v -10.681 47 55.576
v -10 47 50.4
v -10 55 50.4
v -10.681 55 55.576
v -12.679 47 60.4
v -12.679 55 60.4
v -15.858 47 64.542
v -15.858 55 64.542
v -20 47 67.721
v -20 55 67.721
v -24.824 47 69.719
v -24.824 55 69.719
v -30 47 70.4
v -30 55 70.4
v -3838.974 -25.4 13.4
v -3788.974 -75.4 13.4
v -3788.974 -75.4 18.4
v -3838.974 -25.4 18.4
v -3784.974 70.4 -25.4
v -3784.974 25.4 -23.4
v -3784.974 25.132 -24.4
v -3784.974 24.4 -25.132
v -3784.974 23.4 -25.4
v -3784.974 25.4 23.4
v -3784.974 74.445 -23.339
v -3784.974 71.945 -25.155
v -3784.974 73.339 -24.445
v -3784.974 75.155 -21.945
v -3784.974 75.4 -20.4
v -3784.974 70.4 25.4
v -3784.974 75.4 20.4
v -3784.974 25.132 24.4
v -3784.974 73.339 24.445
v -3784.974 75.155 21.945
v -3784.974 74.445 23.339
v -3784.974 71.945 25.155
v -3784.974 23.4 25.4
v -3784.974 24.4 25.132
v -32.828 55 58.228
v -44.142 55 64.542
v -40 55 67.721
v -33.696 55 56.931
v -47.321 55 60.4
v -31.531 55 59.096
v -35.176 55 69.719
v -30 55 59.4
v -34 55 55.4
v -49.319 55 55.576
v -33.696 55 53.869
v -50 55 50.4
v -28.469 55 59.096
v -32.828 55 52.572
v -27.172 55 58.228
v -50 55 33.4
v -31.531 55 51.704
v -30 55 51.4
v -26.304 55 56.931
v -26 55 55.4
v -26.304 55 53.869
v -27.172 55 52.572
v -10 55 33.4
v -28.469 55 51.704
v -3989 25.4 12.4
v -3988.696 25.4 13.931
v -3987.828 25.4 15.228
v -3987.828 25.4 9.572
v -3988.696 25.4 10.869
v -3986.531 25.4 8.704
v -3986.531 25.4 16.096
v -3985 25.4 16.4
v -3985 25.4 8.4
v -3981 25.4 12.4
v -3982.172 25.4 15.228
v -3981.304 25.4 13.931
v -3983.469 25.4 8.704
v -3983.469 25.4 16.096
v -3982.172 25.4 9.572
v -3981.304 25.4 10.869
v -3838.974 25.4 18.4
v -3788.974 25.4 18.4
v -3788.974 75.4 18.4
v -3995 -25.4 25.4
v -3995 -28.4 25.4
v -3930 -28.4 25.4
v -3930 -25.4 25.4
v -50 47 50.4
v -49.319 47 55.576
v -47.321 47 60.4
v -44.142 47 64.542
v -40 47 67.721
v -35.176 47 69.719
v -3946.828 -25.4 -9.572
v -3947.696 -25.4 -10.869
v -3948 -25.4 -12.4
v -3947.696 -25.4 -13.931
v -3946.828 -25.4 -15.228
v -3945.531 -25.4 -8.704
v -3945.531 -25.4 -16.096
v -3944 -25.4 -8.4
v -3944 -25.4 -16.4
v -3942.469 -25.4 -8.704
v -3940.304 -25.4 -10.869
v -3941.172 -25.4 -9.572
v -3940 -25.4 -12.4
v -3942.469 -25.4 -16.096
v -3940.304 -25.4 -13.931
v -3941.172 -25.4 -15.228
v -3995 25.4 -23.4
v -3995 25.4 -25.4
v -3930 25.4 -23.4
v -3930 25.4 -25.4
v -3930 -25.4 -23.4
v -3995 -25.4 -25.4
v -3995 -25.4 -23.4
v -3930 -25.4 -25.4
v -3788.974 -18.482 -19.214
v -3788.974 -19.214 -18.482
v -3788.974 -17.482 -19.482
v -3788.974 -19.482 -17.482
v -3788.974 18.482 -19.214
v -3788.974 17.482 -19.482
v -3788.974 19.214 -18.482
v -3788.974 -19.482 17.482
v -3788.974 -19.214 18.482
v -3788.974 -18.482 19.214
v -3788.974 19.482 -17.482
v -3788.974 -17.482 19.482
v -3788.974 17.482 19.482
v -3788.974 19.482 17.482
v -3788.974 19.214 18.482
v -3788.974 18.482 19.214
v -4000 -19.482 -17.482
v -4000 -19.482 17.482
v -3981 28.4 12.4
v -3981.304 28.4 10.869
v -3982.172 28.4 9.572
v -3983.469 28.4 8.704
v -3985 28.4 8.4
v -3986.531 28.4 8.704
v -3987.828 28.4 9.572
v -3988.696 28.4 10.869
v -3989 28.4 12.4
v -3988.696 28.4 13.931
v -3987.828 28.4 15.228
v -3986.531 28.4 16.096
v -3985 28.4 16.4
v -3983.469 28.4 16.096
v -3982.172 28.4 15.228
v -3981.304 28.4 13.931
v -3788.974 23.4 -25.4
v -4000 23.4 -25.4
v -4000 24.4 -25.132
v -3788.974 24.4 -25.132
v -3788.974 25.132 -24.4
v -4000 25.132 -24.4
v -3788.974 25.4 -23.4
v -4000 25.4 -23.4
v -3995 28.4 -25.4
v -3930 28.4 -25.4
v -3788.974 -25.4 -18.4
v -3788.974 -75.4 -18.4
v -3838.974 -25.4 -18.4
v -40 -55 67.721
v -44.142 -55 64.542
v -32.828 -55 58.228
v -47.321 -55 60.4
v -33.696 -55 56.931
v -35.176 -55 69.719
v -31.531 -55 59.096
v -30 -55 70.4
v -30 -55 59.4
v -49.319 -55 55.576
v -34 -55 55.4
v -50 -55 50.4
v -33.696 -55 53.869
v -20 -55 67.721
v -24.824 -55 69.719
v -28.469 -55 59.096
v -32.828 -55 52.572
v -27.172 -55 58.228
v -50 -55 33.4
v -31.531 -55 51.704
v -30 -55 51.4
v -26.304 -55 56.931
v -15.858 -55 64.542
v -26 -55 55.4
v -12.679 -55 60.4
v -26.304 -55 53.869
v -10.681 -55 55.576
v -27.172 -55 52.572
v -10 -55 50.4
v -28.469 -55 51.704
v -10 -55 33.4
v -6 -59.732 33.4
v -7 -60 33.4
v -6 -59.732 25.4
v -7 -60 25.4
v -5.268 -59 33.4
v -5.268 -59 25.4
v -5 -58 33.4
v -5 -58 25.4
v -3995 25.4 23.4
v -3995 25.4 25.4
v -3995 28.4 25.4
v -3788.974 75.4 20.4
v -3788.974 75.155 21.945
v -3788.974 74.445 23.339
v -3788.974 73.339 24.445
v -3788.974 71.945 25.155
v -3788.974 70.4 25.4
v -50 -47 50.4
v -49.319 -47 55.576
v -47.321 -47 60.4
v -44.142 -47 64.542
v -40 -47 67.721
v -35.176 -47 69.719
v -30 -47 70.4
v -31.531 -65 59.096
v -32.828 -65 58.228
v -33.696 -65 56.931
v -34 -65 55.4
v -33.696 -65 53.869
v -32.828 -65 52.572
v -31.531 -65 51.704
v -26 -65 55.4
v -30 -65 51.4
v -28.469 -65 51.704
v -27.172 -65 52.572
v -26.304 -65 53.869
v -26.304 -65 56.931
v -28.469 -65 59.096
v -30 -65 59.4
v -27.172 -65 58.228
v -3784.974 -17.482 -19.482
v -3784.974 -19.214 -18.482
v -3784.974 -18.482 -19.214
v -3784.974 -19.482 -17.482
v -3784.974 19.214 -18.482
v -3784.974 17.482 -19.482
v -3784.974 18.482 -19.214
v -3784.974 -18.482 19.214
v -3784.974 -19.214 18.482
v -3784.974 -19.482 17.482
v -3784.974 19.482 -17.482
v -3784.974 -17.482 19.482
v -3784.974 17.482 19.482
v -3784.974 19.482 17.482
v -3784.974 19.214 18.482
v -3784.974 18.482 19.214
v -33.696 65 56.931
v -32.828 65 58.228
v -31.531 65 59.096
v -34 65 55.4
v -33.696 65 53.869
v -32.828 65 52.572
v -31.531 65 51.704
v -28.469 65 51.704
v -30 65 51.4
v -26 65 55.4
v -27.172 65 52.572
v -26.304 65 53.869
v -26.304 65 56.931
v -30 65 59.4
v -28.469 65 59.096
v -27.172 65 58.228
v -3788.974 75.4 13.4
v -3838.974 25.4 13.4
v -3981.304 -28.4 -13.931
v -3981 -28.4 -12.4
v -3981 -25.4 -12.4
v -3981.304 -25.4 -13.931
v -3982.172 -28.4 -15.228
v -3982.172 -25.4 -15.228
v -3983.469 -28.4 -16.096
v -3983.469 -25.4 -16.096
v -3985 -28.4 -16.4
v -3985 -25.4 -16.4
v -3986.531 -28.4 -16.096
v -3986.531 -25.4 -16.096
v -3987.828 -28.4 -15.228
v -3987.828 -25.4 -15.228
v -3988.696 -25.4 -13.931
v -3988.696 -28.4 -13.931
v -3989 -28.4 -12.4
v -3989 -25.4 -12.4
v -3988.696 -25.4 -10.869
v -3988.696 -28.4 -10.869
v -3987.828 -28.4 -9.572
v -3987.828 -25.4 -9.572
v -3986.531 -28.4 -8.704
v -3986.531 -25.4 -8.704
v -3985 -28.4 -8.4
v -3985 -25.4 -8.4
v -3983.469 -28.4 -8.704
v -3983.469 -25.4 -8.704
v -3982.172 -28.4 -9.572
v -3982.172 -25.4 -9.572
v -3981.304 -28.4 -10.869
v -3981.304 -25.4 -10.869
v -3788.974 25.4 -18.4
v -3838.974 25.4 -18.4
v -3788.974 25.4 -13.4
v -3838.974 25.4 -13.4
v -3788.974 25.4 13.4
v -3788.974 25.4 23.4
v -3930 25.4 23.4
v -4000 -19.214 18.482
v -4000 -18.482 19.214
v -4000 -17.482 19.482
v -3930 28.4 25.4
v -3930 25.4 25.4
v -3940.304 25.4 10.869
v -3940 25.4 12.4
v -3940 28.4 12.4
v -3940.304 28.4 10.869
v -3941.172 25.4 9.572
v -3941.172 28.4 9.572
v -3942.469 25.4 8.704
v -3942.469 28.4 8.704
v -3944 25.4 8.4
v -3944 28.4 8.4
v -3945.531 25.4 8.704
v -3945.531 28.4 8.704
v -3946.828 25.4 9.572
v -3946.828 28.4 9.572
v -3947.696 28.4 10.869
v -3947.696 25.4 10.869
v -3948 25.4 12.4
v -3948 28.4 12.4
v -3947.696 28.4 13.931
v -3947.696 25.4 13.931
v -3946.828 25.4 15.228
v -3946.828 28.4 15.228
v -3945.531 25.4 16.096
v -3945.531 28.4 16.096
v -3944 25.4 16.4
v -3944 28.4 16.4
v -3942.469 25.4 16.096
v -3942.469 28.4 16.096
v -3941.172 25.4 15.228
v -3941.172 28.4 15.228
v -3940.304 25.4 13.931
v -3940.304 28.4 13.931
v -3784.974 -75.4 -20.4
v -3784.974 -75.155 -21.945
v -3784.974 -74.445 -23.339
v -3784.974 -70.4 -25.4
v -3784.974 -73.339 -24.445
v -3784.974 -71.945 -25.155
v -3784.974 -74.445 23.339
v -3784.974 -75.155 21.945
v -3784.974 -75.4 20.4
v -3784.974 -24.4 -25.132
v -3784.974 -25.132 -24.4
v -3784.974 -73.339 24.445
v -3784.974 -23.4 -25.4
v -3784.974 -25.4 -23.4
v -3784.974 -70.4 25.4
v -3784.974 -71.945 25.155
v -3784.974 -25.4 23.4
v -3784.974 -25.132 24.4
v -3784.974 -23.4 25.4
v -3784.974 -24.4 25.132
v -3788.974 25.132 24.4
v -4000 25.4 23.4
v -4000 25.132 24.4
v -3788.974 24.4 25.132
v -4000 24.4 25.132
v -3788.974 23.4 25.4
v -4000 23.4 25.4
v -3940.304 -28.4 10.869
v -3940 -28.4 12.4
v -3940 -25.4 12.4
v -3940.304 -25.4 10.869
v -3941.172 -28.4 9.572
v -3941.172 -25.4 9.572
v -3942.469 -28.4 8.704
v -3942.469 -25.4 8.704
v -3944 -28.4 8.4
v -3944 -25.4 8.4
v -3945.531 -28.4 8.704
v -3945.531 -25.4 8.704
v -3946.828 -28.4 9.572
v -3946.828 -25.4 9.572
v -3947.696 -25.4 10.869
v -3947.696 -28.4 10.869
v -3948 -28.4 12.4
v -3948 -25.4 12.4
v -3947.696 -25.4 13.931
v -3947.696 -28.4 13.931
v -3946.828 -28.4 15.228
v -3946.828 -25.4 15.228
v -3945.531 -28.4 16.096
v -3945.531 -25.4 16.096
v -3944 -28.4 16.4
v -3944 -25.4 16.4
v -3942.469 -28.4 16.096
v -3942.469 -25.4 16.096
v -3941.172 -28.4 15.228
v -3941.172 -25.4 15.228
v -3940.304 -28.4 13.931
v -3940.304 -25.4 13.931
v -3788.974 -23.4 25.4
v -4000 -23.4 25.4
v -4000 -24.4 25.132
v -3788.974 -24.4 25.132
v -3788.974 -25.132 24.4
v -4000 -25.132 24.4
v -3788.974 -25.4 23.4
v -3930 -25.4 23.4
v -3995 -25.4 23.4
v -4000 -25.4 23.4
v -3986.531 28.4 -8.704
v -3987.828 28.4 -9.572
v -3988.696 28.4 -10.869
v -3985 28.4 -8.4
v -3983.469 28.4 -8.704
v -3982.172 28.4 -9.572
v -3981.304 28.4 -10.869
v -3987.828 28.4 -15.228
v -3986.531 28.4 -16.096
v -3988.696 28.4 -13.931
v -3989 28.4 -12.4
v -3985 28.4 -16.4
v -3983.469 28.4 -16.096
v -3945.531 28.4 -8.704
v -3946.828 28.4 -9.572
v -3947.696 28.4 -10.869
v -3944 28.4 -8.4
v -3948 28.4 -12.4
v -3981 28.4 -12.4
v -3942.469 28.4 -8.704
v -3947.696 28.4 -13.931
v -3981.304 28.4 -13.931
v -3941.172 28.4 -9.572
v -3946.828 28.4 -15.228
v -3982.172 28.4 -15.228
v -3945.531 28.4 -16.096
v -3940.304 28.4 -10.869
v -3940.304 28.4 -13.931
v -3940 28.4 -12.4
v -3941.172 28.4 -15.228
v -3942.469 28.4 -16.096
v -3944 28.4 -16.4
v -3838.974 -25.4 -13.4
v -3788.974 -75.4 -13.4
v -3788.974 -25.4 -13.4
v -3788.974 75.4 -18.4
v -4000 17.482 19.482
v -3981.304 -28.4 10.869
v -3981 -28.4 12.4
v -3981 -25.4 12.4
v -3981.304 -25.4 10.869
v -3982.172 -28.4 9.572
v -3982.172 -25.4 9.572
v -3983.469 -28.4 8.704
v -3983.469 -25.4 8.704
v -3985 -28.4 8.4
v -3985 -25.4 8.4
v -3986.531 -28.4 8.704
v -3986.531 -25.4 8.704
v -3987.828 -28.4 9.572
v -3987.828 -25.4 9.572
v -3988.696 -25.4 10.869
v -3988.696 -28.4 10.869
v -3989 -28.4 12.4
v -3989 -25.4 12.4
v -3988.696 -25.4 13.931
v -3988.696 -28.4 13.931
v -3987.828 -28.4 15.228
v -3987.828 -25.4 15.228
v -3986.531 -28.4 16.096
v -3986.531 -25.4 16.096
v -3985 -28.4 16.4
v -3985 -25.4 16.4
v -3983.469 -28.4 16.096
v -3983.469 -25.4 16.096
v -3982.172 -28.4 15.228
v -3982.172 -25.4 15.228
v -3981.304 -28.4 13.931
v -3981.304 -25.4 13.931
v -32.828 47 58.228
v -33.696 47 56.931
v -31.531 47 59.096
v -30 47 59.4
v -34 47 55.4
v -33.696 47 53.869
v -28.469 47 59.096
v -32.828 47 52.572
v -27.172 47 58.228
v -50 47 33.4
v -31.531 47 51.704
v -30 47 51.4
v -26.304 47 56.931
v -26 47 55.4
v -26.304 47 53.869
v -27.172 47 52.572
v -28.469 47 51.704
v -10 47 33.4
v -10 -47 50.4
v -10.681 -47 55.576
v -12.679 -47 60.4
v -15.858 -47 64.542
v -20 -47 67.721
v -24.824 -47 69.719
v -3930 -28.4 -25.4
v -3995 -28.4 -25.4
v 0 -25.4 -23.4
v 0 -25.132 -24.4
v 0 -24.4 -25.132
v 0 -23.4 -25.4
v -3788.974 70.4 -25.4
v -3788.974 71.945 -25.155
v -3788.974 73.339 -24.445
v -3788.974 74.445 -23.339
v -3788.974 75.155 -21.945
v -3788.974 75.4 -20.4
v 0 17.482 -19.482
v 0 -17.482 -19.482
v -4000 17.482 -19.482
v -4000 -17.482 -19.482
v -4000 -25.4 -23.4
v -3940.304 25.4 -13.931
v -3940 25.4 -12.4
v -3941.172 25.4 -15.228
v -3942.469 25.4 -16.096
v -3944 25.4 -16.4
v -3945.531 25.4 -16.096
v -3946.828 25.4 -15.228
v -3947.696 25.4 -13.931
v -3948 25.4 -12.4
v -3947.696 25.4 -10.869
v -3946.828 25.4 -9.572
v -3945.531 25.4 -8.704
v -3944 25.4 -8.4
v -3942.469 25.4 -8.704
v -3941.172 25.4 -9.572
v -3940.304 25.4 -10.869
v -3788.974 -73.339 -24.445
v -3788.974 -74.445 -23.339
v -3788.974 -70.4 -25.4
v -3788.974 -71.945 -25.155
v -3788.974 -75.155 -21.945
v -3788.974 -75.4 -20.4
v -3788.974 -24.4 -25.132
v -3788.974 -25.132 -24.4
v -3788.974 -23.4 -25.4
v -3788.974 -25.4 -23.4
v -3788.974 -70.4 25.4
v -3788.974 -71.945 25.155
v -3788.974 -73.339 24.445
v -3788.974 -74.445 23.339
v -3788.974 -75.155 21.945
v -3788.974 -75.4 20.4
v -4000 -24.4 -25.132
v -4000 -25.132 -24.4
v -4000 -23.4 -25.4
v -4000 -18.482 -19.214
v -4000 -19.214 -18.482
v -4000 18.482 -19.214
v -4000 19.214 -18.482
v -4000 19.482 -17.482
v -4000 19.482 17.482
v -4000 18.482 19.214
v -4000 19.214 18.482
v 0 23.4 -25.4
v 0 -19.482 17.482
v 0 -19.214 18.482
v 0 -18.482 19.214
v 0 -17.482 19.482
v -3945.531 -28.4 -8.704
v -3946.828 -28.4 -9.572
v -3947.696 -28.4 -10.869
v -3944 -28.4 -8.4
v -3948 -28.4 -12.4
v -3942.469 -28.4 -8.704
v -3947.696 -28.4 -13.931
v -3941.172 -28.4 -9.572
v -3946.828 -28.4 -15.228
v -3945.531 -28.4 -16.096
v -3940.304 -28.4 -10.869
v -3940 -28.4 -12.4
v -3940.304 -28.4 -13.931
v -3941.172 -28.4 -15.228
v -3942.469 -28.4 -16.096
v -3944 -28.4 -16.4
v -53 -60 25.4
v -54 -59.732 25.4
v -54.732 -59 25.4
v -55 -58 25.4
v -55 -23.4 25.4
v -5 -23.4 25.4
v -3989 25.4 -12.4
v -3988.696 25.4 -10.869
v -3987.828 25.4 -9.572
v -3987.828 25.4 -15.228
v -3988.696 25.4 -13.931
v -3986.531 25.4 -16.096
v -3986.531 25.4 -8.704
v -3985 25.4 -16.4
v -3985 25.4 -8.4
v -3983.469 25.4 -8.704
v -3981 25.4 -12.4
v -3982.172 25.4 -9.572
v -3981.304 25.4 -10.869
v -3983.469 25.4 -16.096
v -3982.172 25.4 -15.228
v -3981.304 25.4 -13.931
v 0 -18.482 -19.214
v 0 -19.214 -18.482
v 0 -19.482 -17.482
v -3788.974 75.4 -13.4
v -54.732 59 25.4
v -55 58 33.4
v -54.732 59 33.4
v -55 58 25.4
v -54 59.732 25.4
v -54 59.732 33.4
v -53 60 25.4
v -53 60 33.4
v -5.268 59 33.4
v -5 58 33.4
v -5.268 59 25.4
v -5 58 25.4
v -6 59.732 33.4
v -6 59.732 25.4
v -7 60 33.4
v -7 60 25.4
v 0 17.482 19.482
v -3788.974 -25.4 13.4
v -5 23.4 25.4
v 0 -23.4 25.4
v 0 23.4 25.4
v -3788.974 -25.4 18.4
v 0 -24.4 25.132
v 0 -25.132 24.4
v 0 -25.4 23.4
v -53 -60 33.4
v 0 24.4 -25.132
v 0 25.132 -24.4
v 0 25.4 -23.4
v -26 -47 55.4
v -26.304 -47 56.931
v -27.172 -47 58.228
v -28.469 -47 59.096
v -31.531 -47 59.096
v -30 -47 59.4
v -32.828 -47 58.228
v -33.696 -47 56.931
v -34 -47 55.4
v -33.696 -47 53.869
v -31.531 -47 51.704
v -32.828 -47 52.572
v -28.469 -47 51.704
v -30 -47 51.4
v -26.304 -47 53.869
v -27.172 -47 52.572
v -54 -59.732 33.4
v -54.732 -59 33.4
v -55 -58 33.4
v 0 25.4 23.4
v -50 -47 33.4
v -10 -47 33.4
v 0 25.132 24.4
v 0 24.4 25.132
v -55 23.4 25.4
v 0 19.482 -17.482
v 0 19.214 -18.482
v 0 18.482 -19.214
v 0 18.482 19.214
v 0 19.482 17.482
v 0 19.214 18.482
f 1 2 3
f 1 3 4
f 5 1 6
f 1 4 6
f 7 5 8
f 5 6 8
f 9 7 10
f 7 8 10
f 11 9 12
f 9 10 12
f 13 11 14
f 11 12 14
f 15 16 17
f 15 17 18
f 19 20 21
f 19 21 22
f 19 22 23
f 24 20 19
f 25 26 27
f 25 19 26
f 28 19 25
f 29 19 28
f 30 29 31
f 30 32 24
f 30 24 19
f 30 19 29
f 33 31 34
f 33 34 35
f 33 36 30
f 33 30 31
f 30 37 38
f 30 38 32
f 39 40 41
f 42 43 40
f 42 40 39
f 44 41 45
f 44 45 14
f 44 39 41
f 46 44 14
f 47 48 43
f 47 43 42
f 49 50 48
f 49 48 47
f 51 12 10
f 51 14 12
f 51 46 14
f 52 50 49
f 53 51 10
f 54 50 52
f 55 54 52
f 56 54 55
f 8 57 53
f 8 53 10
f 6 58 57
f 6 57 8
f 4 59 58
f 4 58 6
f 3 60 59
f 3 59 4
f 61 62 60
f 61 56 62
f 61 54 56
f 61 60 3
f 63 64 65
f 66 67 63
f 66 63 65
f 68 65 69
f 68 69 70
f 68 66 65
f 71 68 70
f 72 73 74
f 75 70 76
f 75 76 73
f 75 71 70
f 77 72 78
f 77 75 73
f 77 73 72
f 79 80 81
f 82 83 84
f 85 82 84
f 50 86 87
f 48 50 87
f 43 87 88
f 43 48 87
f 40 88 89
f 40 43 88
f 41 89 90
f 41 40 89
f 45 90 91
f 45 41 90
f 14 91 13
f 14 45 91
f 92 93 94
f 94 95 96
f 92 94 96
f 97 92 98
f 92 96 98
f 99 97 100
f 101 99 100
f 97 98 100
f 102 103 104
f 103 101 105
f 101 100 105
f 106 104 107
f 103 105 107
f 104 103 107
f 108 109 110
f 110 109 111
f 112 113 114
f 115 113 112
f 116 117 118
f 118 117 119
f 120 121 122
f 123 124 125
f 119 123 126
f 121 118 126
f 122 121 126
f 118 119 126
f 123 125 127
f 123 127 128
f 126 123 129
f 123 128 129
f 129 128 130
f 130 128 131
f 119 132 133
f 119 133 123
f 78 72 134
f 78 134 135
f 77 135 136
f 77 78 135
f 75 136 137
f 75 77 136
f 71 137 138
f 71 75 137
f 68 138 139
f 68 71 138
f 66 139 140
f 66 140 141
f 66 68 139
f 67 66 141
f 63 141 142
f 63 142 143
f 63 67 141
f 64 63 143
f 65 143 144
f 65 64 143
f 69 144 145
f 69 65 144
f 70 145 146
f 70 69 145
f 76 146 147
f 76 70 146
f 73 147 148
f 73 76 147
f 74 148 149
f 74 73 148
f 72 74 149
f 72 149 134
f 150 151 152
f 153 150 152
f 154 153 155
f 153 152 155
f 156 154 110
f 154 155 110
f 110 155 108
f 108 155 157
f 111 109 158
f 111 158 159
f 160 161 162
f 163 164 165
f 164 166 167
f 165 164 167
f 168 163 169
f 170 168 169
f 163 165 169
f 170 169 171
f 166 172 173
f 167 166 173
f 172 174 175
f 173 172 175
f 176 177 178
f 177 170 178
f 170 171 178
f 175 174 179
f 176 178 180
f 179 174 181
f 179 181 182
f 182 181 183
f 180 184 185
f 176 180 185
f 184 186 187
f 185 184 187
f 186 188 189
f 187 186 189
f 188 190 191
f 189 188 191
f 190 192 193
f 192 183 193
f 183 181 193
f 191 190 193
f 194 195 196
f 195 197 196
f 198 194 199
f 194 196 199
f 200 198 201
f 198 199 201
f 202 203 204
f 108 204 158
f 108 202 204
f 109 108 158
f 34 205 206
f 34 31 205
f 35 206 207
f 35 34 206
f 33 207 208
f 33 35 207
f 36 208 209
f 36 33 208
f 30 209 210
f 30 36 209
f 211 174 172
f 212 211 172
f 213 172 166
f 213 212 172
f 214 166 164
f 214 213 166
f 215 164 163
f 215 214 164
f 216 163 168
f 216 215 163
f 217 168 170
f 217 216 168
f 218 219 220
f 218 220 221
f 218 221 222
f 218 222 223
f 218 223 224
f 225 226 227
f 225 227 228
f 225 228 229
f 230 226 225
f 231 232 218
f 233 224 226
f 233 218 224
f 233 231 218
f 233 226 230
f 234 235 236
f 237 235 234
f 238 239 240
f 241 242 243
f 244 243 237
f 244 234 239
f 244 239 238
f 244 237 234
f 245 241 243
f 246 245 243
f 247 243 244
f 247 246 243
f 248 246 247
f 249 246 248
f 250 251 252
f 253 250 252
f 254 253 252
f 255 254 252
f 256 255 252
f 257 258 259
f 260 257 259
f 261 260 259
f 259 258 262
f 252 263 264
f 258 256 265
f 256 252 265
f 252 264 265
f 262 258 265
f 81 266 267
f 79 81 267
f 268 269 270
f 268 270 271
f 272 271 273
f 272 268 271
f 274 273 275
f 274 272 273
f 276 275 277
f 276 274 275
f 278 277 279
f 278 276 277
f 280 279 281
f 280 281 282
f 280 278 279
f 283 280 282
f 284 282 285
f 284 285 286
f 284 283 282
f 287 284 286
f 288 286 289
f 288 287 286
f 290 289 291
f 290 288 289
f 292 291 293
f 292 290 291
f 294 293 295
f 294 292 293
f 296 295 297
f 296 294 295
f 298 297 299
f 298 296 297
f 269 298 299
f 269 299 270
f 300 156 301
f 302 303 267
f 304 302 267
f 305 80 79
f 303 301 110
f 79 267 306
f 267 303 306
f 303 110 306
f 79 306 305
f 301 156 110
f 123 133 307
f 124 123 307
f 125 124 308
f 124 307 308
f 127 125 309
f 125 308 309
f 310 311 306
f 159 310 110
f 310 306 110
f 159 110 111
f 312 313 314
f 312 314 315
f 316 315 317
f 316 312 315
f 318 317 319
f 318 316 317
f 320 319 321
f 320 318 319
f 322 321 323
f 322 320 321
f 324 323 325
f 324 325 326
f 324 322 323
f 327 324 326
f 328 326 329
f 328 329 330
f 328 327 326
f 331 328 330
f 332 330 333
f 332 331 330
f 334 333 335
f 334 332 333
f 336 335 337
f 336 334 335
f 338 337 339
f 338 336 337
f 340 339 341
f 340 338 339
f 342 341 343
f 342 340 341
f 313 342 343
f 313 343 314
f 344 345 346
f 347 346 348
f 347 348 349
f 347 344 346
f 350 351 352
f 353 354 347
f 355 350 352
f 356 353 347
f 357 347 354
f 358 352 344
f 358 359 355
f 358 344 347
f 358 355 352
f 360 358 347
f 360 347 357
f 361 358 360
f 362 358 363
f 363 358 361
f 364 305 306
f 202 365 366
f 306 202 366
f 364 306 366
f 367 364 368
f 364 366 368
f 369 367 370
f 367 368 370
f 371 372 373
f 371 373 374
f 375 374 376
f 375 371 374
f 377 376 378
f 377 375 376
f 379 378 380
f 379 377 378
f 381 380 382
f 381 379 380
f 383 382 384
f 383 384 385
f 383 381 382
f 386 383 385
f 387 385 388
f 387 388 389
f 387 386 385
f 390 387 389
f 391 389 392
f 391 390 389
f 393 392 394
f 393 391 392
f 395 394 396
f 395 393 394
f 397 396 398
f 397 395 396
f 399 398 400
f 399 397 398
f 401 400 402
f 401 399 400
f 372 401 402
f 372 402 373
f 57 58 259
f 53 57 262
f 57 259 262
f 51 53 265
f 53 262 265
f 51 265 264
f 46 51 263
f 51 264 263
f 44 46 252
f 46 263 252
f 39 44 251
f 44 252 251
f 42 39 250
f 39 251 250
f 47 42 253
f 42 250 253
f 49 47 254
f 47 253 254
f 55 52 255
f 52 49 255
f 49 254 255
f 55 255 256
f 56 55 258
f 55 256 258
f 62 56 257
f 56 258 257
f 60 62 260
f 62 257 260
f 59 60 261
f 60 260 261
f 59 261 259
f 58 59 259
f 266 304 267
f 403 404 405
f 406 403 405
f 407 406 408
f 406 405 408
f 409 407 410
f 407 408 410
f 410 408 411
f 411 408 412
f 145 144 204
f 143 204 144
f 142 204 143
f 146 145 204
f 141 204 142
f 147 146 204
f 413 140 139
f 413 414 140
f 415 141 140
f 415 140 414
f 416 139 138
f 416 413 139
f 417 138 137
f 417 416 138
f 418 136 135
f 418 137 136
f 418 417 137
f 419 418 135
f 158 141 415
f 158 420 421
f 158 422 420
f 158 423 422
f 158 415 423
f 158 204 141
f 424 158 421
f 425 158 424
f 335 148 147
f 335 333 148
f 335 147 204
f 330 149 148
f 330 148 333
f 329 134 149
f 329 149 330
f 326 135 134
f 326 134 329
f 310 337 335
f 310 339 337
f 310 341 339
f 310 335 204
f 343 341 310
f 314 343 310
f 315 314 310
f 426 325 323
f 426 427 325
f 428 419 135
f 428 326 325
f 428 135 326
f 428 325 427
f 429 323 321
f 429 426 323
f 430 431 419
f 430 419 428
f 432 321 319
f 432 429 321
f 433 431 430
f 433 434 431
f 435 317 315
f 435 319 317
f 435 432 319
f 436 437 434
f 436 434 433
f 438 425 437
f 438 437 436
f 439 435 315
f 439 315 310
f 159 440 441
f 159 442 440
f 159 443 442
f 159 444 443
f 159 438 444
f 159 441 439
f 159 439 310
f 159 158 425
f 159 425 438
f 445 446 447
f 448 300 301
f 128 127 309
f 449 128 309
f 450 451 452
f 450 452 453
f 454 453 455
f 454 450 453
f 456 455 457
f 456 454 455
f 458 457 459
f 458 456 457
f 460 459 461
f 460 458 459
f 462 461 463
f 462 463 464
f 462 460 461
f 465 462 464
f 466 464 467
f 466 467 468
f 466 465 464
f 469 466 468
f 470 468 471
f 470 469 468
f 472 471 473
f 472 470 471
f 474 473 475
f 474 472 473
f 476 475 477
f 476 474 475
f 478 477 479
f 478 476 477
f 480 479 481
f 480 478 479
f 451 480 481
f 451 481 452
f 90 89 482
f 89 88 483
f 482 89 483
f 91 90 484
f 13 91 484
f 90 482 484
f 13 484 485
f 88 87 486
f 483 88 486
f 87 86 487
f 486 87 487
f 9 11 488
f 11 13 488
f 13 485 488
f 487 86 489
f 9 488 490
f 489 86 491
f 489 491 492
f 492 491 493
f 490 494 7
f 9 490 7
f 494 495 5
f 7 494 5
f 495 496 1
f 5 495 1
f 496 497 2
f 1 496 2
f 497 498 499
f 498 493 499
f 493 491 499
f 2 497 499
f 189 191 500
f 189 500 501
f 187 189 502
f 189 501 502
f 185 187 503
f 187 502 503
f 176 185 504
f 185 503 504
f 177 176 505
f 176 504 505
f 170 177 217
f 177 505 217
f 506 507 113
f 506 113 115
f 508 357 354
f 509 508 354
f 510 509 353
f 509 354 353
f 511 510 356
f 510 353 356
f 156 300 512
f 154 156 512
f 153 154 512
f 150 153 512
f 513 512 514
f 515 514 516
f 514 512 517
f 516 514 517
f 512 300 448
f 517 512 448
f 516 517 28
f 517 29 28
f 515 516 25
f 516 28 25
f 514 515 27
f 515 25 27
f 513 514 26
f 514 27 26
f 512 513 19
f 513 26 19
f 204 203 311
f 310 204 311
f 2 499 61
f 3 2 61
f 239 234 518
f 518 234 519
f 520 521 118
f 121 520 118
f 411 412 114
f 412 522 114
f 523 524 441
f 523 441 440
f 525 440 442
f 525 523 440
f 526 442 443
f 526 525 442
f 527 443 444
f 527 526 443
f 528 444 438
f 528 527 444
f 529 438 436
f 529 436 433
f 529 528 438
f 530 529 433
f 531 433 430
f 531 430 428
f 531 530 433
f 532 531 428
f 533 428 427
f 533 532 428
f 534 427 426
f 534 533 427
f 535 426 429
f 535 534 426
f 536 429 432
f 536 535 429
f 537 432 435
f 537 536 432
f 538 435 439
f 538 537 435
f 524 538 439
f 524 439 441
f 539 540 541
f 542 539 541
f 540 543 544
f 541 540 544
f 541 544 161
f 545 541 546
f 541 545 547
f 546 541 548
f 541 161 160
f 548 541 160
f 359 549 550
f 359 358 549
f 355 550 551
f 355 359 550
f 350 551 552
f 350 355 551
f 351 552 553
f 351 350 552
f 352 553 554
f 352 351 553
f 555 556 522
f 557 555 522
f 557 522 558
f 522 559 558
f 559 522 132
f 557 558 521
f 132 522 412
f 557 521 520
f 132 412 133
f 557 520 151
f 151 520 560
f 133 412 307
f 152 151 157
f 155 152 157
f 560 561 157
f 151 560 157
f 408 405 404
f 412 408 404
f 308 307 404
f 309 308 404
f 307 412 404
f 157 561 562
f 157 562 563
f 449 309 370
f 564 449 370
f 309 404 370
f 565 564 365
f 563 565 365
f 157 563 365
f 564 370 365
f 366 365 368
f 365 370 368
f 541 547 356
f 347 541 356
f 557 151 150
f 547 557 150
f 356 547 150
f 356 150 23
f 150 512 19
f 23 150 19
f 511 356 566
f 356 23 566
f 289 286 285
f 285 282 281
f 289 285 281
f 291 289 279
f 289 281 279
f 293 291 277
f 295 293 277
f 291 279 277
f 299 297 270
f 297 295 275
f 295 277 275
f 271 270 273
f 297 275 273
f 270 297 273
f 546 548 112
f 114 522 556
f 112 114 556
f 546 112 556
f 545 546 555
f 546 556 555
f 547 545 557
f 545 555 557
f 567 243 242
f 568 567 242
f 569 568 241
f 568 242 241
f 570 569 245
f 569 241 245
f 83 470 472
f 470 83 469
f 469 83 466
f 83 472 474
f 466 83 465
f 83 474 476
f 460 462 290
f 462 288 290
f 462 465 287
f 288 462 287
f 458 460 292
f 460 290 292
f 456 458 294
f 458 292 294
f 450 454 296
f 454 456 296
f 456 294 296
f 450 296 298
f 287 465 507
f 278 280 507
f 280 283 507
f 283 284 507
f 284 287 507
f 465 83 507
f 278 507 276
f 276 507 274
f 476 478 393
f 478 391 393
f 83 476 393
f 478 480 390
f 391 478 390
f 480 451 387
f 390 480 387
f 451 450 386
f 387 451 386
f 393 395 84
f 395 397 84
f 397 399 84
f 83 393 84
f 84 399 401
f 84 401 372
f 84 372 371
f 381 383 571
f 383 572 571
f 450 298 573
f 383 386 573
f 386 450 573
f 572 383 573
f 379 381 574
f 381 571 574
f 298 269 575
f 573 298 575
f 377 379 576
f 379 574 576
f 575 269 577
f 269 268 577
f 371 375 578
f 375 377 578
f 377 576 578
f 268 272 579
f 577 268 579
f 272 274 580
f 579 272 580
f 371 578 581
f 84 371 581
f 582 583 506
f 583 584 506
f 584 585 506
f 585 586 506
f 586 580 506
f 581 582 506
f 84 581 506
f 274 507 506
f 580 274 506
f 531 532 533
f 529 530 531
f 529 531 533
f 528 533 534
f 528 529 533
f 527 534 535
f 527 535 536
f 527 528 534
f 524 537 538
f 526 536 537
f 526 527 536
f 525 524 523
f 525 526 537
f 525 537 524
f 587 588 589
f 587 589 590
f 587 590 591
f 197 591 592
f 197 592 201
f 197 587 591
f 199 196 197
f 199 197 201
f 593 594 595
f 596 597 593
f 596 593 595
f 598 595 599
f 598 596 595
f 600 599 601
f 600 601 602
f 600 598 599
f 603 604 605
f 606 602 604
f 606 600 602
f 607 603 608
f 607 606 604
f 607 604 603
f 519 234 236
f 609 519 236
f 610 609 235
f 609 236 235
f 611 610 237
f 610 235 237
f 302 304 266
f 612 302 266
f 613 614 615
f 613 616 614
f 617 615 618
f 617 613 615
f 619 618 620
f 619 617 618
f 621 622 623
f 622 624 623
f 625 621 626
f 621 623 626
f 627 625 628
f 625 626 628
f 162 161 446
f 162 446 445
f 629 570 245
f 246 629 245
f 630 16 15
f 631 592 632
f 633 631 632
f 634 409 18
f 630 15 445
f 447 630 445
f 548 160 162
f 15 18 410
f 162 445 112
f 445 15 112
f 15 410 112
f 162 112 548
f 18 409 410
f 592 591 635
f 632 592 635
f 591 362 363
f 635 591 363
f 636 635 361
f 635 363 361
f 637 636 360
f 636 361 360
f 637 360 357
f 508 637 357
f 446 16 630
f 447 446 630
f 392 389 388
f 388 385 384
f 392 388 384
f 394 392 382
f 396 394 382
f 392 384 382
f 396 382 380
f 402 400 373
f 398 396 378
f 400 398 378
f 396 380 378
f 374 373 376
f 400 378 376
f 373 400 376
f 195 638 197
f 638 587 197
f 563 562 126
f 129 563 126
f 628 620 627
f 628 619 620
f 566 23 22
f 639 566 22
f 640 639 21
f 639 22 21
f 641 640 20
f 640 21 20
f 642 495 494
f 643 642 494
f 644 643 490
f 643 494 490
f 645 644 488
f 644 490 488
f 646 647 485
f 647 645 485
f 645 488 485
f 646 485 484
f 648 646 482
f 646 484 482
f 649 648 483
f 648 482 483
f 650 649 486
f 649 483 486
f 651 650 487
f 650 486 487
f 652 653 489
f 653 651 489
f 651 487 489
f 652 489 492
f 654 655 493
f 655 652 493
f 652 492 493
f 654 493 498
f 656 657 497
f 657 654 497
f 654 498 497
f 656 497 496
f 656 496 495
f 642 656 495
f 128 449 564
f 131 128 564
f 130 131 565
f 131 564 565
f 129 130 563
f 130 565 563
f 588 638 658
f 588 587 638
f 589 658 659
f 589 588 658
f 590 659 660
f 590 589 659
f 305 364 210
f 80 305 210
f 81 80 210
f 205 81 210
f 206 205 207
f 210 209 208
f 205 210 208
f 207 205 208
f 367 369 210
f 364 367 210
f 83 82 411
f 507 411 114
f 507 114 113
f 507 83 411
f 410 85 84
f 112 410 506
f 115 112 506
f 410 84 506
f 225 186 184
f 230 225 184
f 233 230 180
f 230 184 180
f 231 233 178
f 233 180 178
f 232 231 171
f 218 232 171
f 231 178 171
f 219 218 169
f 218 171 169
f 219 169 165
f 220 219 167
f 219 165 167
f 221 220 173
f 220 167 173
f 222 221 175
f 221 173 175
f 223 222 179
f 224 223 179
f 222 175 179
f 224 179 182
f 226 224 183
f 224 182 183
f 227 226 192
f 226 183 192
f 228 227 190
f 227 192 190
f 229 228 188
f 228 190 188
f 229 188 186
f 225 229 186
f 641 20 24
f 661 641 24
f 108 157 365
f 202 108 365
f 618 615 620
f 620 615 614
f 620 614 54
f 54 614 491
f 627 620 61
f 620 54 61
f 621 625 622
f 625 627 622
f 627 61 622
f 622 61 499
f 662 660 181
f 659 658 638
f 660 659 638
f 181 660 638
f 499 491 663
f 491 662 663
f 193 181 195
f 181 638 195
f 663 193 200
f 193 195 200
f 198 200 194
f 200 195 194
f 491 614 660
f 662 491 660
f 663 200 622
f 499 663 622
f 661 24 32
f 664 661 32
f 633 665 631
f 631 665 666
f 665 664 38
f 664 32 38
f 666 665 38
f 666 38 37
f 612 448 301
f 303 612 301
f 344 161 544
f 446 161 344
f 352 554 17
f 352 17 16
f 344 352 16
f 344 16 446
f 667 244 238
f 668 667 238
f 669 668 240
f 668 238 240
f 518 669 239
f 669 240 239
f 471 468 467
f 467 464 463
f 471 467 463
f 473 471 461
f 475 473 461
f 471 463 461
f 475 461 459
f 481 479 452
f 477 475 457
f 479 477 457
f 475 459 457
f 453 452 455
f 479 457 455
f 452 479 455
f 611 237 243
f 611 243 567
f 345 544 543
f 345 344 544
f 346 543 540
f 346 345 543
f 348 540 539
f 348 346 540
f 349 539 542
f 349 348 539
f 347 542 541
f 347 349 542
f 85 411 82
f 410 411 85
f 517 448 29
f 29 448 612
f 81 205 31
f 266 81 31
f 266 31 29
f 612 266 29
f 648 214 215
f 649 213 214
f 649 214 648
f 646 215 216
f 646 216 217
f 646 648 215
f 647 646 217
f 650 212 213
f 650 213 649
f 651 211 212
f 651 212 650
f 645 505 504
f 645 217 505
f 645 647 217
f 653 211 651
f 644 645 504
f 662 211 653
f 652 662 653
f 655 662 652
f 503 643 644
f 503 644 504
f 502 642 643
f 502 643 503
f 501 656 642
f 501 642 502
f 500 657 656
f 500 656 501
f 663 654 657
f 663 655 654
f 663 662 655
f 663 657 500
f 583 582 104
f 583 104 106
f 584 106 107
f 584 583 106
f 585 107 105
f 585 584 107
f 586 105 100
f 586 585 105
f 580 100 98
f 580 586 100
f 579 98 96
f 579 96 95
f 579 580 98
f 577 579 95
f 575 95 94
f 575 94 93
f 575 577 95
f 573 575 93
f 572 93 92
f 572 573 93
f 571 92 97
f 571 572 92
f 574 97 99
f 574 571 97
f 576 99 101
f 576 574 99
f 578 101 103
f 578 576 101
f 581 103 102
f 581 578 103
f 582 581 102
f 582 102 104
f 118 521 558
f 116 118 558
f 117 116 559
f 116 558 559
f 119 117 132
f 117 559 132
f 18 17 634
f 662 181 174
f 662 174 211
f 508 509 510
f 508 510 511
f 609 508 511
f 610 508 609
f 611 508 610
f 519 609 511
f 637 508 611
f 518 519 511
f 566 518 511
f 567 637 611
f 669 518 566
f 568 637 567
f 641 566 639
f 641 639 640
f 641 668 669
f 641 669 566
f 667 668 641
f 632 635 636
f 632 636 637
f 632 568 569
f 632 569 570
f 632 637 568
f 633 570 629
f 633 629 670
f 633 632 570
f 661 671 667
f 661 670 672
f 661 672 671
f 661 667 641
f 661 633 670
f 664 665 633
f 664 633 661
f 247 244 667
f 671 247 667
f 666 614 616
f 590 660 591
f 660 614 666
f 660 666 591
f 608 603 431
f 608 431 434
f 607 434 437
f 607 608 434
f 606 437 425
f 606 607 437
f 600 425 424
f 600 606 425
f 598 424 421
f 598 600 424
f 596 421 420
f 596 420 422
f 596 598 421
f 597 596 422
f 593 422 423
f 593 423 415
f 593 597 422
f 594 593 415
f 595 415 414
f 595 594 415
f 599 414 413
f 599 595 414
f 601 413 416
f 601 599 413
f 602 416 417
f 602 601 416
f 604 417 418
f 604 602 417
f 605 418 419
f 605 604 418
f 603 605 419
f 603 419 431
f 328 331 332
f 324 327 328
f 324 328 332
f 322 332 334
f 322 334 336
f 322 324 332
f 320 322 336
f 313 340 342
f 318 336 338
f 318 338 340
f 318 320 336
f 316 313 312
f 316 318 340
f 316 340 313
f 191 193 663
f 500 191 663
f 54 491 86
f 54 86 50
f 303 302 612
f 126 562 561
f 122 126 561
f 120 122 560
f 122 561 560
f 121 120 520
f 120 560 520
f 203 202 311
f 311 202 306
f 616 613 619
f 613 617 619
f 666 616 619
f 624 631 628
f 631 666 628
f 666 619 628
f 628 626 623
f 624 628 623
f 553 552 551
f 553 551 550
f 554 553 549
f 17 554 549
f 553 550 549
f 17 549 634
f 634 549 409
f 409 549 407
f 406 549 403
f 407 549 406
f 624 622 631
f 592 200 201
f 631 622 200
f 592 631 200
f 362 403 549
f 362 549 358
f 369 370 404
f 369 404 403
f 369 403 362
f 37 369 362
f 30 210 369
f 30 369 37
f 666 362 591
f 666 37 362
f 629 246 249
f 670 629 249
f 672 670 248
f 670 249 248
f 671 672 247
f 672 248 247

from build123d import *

# Parameters (mm, degrees)
BOSS_EXTRUDE2_START         = -23.4
BOSS_EXTRUDE2_OUTLINE_W     = 4000
BOSS_EXTRUDE2_OUTLINE_H     = 5.9182
BOSS_EXTRUDE2_DEPTH         = 46.8
BOSS_EXTRUDE2_START_2       = -25.4
BOSS_EXTRUDE2_2_OUTLINE_W   = 50
BOSS_EXTRUDE2_2_OUTLINE_H   = 8
BOSS_EXTRUDE2_2_OUTLINE_W_2 = 4000
BOSS_EXTRUDE2_2_OUTLINE_H_2 = 38.9636
BOSS_EXTRUDE2_2_DEPTH       = 5.9182
BOSS_EXTRUDE2_START_3       = 19.4818
BOSS_EXTRUDE2_3_OUTLINE_W   = 50
BOSS_EXTRUDE2_3_OUTLINE_H   = 8
BOSS_EXTRUDE2_3_OUTLINE_W_2 = 4000
BOSS_EXTRUDE2_3_OUTLINE_H_2 = 38.9636
BOSS_EXTRUDE2_3_DEPTH       = 5.9182
BOSS_EXTRUDE2_START_4       = -60
BOSS_EXTRUDE2_4_OUTLINE_W   = 50
BOSS_EXTRUDE2_4_OUTLINE_H   = 8
BOSS_EXTRUDE2_4_DEPTH       = 120
BOSS_EXTRUDE2_START_5       = -28.4
BOSS_EXTRUDE2_5_OUTLINE_W   = 65
BOSS_EXTRUDE2_5_OUTLINE_H   = 50.8
BOSS_EXTRUDE2_5_OUTLINE_R   = 4
BOSS_EXTRUDE2_5_DEPTH       = 3
BOSS_EXTRUDE2_START_6       = 25.4
BOSS_EXTRUDE2_6_OUTLINE_W   = 65
BOSS_EXTRUDE2_6_OUTLINE_H   = 50.8
BOSS_EXTRUDE2_6_OUTLINE_R   = 4
BOSS_EXTRUDE2_6_DEPTH       = 3
BOSS_EXTRUDE2_START_7       = -4000
BOSS_EXTRUDE2_7_DEPTH       = 4000
SKETCH1_W                   = 40
SKETCH1_H                   = 8
BOSS_EXTRUDE1_DEPTH         = 45
FILLET1_R                   = 20
FILLET2_R                   = 2
BOSS_EXTRUDE3_DEPTH         = 10
BOSS_EXTRUDE3_DEPTH_BACK    = 120
SKETCH3_R                   = 4
SKETCH4_W                   = 4
SKETCH4_H                   = 150.8
BOSS_EXTRUDE4_DEPTH         = 50.8
SKETCH5_W                   = 5
SKETCH5_H                   = 50
BOSS_EXTRUDE5_DEPTH         = 50
CUT_EXTRUDE4_DEPTH          = 4002.695965463
FILLET3_R                   = 5
FILLET4_R                   = 5
FILLET5_R                   = 5
FILLET6_R                   = 5


with BuildPart() as part:
    # Boss-Extrude2: read off the stored shape, not the designer's step
    # Boss-Extrude2 outline → Boss-Extrude2 (new body)
    with BuildSketch(Plane(origin=(0, 0, 0), x_dir=(1, 0, 0), z_dir=(0, 1, 0)).offset(BOSS_EXTRUDE2_START)):
        Polygon((-55, -25.4), (-55, -33.4), (-5, -33.4), (-5, -25.4), (0, -25.4), (0, -19.4818), (-4000, -19.4818), (-4000, -25.4), align=None)
        with Locations((-2000, 22.4409)):
            Rectangle(BOSS_EXTRUDE2_OUTLINE_W, BOSS_EXTRUDE2_OUTLINE_H)
    extrude(amount=BOSS_EXTRUDE2_DEPTH)

    # Boss-Extrude2 2 outline → Boss-Extrude2 2 (add)
    with BuildSketch(Plane(origin=(0, 0, 0), x_dir=(1, 0, 0), z_dir=(0, 1, 0)).offset(BOSS_EXTRUDE2_START_2)):
        with Locations((-30, -29.4)):
            Rectangle(BOSS_EXTRUDE2_2_OUTLINE_W, BOSS_EXTRUDE2_2_OUTLINE_H)
        with Locations((-2000, 0)):
            Rectangle(BOSS_EXTRUDE2_2_OUTLINE_W_2, BOSS_EXTRUDE2_2_OUTLINE_H_2)
    extrude(amount=BOSS_EXTRUDE2_2_DEPTH)

    # Boss-Extrude2 3 outline → Boss-Extrude2 3 (add)
    with BuildSketch(Plane(origin=(0, 0, 0), x_dir=(1, 0, 0), z_dir=(0, 1, 0)).offset(BOSS_EXTRUDE2_START_3)):
        with Locations((-30, -29.4)):
            Rectangle(BOSS_EXTRUDE2_3_OUTLINE_W, BOSS_EXTRUDE2_3_OUTLINE_H)
        with Locations((-2000, 0)):
            Rectangle(BOSS_EXTRUDE2_3_OUTLINE_W_2, BOSS_EXTRUDE2_3_OUTLINE_H_2)
    extrude(amount=BOSS_EXTRUDE2_3_DEPTH)

    # Boss-Extrude2 4 outline → Boss-Extrude2 4 (add)
    with BuildSketch(Plane(origin=(0, 0, 0), x_dir=(1, 0, 0), z_dir=(0, 1, 0)).offset(BOSS_EXTRUDE2_START_4)):
        with Locations((-30, -29.4)):
            Rectangle(BOSS_EXTRUDE2_4_OUTLINE_W, BOSS_EXTRUDE2_4_OUTLINE_H)
    extrude(amount=BOSS_EXTRUDE2_4_DEPTH)

    # Boss-Extrude2 5 outline → Boss-Extrude2 5 (add)
    with BuildSketch(Plane(origin=(0, 0, 0), x_dir=(1, 0, 0), z_dir=(0, 1, 0)).offset(BOSS_EXTRUDE2_START_5)):
        with Locations((-3962.5, 0)):
            Rectangle(BOSS_EXTRUDE2_5_OUTLINE_W, BOSS_EXTRUDE2_5_OUTLINE_H)
        with Locations((-3944, 12.4)):
            Circle(BOSS_EXTRUDE2_5_OUTLINE_R, mode=Mode.SUBTRACT)
        with Locations((-3985, -12.4)):
            Circle(BOSS_EXTRUDE2_5_OUTLINE_R, mode=Mode.SUBTRACT)
        with Locations((-3944, -12.4)):
            Circle(BOSS_EXTRUDE2_5_OUTLINE_R, mode=Mode.SUBTRACT)
        with Locations((-3985, 12.4)):
            Circle(BOSS_EXTRUDE2_5_OUTLINE_R, mode=Mode.SUBTRACT)
    extrude(amount=BOSS_EXTRUDE2_5_DEPTH)

    # Boss-Extrude2 6 outline → Boss-Extrude2 6 (add)
    with BuildSketch(Plane(origin=(0, 0, 0), x_dir=(1, 0, 0), z_dir=(0, 1, 0)).offset(BOSS_EXTRUDE2_START_6)):
        with Locations((-3962.5, 0)):
            Rectangle(BOSS_EXTRUDE2_6_OUTLINE_W, BOSS_EXTRUDE2_6_OUTLINE_H)
        with Locations((-3944, 12.4)):
            Circle(BOSS_EXTRUDE2_6_OUTLINE_R, mode=Mode.SUBTRACT)
        with Locations((-3985, -12.4)):
            Circle(BOSS_EXTRUDE2_6_OUTLINE_R, mode=Mode.SUBTRACT)
        with Locations((-3944, -12.4)):
            Circle(BOSS_EXTRUDE2_6_OUTLINE_R, mode=Mode.SUBTRACT)
        with Locations((-3985, 12.4)):
            Circle(BOSS_EXTRUDE2_6_OUTLINE_R, mode=Mode.SUBTRACT)
    extrude(amount=BOSS_EXTRUDE2_6_DEPTH)

    # Boss-Extrude2 7 outline → Boss-Extrude2 7 (add)
    with BuildSketch(Plane.YZ.offset(BOSS_EXTRUDE2_START_7)):
        with BuildLine():
            Line((23.4, 19.4818), (25.4, 19.4818))
            Line((25.4, 19.4818), (25.4, 23.4))
            ThreePointArc((25.4, 23.4), (24.814213562, 24.814213562), (23.4, 25.4))
            Line((23.4, 25.4), (23.4, 19.4818))
        make_face()
        with BuildLine():
            ThreePointArc((23.4, -25.4), (24.814213562, -24.814213562), (25.4, -23.4))
            Line((25.4, -23.4), (25.4, -19.4818))
            Line((25.4, -19.4818), (23.4, -19.4818))
            Line((23.4, -19.4818), (23.4, -25.4))
        make_face()
        with BuildLine():
            Line((19.4818, 19.4818), (17.4818, 19.4818))
            ThreePointArc((17.4818, 19.4818), (18.896013562, 18.896013562), (19.4818, 17.4818))
            Line((19.4818, 17.4818), (19.4818, 19.4818))
        make_face()
        with BuildLine():
            ThreePointArc((-19.4818, 17.4818), (-18.896013562, 18.896013562), (-17.4818, 19.4818))
            Line((-17.4818, 19.4818), (-19.4818, 19.4818))
            Line((-19.4818, 19.4818), (-19.4818, 17.4818))
        make_face()
        with BuildLine():
            Line((19.4818, -19.4818), (19.4818, -17.4818))
            ThreePointArc((19.4818, -17.4818), (18.896013562, -18.896013562), (17.4818, -19.4818))
            Line((17.4818, -19.4818), (19.4818, -19.4818))
        make_face()
        with BuildLine():
            ThreePointArc((-17.4818, -19.4818), (-18.896013562, -18.896013562), (-19.4818, -17.4818))
            Line((-19.4818, -17.4818), (-19.4818, -19.4818))
            Line((-19.4818, -19.4818), (-17.4818, -19.4818))
        make_face()
        with BuildLine():
            Line((-25.4, 23.4), (-25.4, 19.4818))
            Line((-25.4, 19.4818), (-23.4, 19.4818))
            Line((-23.4, 19.4818), (-23.4, 25.4))
            ThreePointArc((-23.4, 25.4), (-24.814213562, 24.814213562), (-25.4, 23.4))
        make_face()
        with BuildLine():
            ThreePointArc((-25.4, -23.4), (-24.814213562, -24.814213562), (-23.4, -25.4))
            Line((-23.4, -25.4), (-23.4, -19.4818))
            Line((-23.4, -19.4818), (-25.4, -19.4818))
            Line((-25.4, -19.4818), (-25.4, -23.4))
        make_face()
    extrude(amount=BOSS_EXTRUDE2_7_DEPTH)

    # Sketch1 → Boss-Extrude1 (add)
    with BuildSketch(Plane.XY.offset(25.4)):
        with Locations((-30, 51)):
            Rectangle(SKETCH1_W, SKETCH1_H)
        with Locations((-30, -51)):
            Rectangle(SKETCH1_W, SKETCH1_H)
    extrude(amount=BOSS_EXTRUDE1_DEPTH)

    # Fillet1
    fillet1_edges = [part.edges().sort_by_distance(p)[0] for p in [
        (-10, 51, 70.4),
        (-50, 51, 70.4),
        (-50, -51, 70.4),
        (-10, -51, 70.4),
    ]]
    fillet(fillet1_edges, radius=FILLET1_R - 0.0001)  # a hair under: the kernel refuses the full size

    # Fillet2
    fillet2_edges = [part.edges().sort_by_distance(p)[0] for p in [
        (-5, -60, 29.4),
        (-5, 60, 29.4),
        (-55, 60, 29.4),
        (-55, -60, 29.4),
    ]]
    fillet(fillet2_edges, radius=FILLET2_R)

    # Sketch3 → Boss-Extrude3 (add, two sides: drawn at the far end of the back side and taken through both)
    with BuildSketch(Plane.XZ.offset(55).offset(-BOSS_EXTRUDE3_DEPTH_BACK)):
        with Locations((-30, 55.4)):
            Circle(SKETCH3_R)
    extrude(amount=BOSS_EXTRUDE3_DEPTH + BOSS_EXTRUDE3_DEPTH_BACK)

    # Sketch4 → Boss-Extrude4 (add)
    with BuildSketch(Plane.XY.offset(25.4)):
        with Locations((-3786.973621807, 0)):
            Rectangle(SKETCH4_W, SKETCH4_H)
    extrude(amount=-BOSS_EXTRUDE4_DEPTH)

    # Sketch5 → Boss-Extrude5 (add)
    with BuildSketch(Plane.ZY.offset(3788.973621807)):
        with Locations((15.9, 50.4)):
            Rectangle(SKETCH5_W, SKETCH5_H)
        with Locations((15.9, -50.4)):
            Rectangle(SKETCH5_W, SKETCH5_H)
        with Locations((-15.9, -50.4)):
            Rectangle(SKETCH5_W, SKETCH5_H)
        with Locations((-15.9, 50.4)):
            Rectangle(SKETCH5_W, SKETCH5_H)
    extrude(amount=BOSS_EXTRUDE5_DEPTH)

    # Sketch6 → Cut-Extrude4 (cut, through all)
    with BuildSketch(Plane(origin=(0, 0, -18.4), x_dir=(-1, 0, 0), z_dir=(0, 0, -1))):
        Polygon((3788.973621807, 75.4), (3838.973621807, 25.4), (3838.973621807, 75.4), align=None)
        Polygon((3788.973621807, -75.4), (3838.973621807, -25.4), (3838.973621807, -75.4), align=None)
    extrude(amount=-CUT_EXTRUDE4_DEPTH, mode=Mode.SUBTRACT)

    # Fillet3
    fillet3_edges = [part.edges().sort_by_distance(p)[0] for p in [
        (-3786.973621807, 75.4, -25.4),
    ]]
    fillet(fillet3_edges, radius=FILLET3_R)

    # Fillet4
    fillet4_edges = [part.edges().sort_by_distance(p)[0] for p in [
        (-3786.973621807, 75.4, 25.4),
    ]]
    fillet(fillet4_edges, radius=FILLET4_R)

    # Fillet5
    fillet5_edges = [part.edges().sort_by_distance(p)[0] for p in [
        (-3786.973621807, -75.4, 25.4),
    ]]
    fillet(fillet5_edges, radius=FILLET5_R)

    # Fillet6
    fillet6_edges = [part.edges().sort_by_distance(p)[0] for p in [
        (-3786.973621807, -75.4, -25.4),
    ]]
    fillet(fillet6_edges, radius=FILLET6_R)


solid = part.part
